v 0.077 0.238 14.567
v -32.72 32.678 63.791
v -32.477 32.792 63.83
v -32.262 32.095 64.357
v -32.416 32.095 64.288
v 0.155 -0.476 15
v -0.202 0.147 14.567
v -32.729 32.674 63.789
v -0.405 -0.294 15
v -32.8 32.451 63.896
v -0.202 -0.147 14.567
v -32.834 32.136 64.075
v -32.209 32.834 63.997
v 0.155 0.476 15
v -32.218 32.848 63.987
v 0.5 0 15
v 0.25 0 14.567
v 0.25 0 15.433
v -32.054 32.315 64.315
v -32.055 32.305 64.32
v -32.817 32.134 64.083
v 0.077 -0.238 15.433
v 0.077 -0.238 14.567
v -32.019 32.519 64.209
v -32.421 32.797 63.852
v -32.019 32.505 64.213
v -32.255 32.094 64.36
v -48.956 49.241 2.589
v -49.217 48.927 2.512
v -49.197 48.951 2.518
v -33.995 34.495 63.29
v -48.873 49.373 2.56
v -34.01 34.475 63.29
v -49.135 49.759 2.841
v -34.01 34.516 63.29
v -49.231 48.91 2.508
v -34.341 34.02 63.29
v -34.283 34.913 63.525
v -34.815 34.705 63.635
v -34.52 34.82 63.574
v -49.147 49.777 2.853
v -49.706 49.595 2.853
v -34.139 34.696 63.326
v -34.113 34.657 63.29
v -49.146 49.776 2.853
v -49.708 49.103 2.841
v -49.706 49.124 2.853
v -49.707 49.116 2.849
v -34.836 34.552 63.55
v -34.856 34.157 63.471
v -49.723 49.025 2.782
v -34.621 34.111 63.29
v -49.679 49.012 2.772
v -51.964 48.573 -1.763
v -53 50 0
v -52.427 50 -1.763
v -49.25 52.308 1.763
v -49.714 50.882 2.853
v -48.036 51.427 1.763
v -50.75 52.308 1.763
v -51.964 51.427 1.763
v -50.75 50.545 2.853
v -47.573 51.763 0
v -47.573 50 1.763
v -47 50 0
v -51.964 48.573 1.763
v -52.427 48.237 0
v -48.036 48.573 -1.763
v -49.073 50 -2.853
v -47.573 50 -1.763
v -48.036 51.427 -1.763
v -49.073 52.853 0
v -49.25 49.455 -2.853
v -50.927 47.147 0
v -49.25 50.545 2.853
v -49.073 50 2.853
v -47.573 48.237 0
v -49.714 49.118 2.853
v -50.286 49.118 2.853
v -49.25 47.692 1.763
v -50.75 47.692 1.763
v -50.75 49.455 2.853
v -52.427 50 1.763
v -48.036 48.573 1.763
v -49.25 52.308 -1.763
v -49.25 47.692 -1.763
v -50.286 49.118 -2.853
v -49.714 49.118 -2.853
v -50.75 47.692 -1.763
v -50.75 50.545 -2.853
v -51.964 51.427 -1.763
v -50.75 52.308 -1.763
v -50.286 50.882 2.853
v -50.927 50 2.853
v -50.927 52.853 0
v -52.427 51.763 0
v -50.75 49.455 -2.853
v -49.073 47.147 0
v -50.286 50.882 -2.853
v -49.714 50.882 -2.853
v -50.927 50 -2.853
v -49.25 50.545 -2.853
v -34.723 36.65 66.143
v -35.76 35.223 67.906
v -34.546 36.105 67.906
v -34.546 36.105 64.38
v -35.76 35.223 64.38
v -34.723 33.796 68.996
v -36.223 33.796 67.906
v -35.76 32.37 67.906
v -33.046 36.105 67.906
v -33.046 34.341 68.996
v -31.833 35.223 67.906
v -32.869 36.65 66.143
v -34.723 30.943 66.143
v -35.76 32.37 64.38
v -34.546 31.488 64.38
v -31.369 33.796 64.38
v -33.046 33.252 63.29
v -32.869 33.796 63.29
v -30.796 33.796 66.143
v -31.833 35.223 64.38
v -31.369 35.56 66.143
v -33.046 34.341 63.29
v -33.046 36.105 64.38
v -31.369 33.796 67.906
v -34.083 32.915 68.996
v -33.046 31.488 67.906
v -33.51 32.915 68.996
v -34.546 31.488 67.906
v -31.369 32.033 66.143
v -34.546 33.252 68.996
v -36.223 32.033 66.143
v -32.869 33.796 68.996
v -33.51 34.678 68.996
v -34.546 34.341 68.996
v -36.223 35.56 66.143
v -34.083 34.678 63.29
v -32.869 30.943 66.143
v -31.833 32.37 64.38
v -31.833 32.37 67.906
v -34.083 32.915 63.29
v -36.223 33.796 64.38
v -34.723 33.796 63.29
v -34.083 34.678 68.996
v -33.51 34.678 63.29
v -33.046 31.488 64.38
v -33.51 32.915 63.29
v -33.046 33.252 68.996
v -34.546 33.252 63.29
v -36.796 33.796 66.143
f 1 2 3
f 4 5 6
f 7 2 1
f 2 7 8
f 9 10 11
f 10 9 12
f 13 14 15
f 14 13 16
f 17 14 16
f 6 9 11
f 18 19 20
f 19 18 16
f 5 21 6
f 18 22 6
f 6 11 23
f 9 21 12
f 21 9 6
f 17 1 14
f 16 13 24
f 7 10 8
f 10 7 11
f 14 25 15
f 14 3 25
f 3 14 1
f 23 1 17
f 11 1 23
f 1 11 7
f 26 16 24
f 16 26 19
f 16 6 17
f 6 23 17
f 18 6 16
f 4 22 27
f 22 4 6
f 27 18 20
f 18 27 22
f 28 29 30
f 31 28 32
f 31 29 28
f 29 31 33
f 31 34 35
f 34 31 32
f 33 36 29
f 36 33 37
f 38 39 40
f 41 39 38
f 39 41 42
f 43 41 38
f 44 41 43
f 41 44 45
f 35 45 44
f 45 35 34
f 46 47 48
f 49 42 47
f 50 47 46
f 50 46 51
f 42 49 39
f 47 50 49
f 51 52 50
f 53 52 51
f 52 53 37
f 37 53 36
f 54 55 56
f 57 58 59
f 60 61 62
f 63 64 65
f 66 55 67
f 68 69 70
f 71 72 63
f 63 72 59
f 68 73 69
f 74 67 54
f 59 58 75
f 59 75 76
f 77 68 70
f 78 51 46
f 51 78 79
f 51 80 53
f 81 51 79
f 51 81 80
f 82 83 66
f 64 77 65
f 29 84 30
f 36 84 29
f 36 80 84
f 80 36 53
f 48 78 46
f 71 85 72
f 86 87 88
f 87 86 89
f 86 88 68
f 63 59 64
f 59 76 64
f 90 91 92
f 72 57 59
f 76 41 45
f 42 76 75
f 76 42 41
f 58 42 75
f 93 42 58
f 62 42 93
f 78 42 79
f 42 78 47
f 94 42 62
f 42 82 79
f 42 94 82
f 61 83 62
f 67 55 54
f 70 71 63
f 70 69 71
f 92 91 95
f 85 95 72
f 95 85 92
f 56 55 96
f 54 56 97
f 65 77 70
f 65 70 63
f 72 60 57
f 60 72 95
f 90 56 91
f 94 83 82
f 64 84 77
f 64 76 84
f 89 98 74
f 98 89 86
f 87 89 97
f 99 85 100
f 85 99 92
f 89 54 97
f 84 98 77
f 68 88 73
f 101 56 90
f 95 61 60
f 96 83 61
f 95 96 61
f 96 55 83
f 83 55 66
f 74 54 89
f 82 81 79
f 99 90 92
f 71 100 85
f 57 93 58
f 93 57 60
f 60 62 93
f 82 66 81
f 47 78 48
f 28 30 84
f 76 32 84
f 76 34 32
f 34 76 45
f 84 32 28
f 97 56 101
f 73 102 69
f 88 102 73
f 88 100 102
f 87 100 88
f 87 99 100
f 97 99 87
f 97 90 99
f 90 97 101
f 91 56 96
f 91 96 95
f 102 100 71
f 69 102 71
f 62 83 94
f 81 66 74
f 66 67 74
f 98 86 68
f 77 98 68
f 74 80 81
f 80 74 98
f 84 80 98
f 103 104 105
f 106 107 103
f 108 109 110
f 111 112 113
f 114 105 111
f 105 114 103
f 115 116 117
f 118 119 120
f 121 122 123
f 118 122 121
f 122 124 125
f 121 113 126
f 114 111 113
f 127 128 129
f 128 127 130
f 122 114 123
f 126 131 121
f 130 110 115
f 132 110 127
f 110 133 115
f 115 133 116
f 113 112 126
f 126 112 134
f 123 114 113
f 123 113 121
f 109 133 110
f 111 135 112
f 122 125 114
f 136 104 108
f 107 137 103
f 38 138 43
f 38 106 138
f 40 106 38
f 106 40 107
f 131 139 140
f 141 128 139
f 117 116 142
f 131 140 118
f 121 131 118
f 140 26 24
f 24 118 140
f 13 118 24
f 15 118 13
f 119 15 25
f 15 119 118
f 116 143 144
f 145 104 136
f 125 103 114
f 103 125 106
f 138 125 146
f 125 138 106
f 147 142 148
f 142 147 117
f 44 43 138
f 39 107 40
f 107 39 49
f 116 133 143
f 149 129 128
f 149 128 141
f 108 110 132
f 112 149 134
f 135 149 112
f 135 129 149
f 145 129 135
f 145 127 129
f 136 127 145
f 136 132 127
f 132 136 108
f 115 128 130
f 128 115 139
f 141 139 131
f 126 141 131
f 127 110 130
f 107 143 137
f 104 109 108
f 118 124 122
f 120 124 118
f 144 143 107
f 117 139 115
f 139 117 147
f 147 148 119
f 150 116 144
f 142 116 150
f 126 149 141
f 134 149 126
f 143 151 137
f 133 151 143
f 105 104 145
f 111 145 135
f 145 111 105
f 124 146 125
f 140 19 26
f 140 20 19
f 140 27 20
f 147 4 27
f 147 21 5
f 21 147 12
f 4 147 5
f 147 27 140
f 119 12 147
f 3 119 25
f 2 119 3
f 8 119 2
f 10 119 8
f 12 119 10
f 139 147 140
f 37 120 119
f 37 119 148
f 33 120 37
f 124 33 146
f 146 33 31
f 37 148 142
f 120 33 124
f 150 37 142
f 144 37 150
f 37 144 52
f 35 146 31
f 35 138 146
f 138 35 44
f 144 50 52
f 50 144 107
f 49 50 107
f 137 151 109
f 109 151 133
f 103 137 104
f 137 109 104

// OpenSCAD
/* IK solves the knee position of a two segment leg between 
point a and b of a specifyed length, bending preferably towards provided sky_vector   
If b is further than the leg is long it does its best to reach for b*/


a=[0,0,15]; b=[-50,50,0]; length=140;
c= IK(a,b,length );
line(a,c);
line(c,b);
translate(b)sphere(3);
translate(c)sphere(3);

function IK(start,end,length,sky_vector=[0,0,1],bias=0.5)=(len3(start-end))>length?
let(new_end=(start+un(end-start)*length) ,e=echo(new_end,len3(new_end),length))
IK(start,new_end,length,sky_vector,bias):
lerp(start,end,bias)+
(
un( flipxy(end-start,sky_vector))*un(sky_vector).y*IK2(length,(end-start))+
un( flipxz(end-start,sky_vector))*un(sky_vector).z*IK2(length,(end-start))+
un( end-start)                   *un(sky_vector).x*IK2(length,(end-start)))
;
function IK2(l,v)=sqrt(pow(l/2,2)-pow(min(len3(v),l)/2,2));
function flipxz(v,sky_vector=[0,0,1])=un(cross(v,flipxy(v,sky_vector)))*len3(v);
function flipxy(v,sky_vector=[0,0,1])=un(cross(sky_vector,v))*len3(v);

/*Dependencies*/
function len3(v) =len(v)>1?
sqrt(addl([for(i=[0:len(v)-1])pow(v[i], 2)])):len(v)==1?v[0]:v; 
function addl(l,c=0)= len(l)-1 >c?l[c]+addl(l,c+1):l[c];
function un(v)=v/max(len3(v),1e-64);
function lerp(start,end,bias=0.5)=(end*bias+start*(1-bias));
/* End of dependencies*/

module line(p1, p2 ,width=0.5) 
{
    hull() {
        translate(p1) sphere(width);
        translate(p2) sphere(width);
    }
}
